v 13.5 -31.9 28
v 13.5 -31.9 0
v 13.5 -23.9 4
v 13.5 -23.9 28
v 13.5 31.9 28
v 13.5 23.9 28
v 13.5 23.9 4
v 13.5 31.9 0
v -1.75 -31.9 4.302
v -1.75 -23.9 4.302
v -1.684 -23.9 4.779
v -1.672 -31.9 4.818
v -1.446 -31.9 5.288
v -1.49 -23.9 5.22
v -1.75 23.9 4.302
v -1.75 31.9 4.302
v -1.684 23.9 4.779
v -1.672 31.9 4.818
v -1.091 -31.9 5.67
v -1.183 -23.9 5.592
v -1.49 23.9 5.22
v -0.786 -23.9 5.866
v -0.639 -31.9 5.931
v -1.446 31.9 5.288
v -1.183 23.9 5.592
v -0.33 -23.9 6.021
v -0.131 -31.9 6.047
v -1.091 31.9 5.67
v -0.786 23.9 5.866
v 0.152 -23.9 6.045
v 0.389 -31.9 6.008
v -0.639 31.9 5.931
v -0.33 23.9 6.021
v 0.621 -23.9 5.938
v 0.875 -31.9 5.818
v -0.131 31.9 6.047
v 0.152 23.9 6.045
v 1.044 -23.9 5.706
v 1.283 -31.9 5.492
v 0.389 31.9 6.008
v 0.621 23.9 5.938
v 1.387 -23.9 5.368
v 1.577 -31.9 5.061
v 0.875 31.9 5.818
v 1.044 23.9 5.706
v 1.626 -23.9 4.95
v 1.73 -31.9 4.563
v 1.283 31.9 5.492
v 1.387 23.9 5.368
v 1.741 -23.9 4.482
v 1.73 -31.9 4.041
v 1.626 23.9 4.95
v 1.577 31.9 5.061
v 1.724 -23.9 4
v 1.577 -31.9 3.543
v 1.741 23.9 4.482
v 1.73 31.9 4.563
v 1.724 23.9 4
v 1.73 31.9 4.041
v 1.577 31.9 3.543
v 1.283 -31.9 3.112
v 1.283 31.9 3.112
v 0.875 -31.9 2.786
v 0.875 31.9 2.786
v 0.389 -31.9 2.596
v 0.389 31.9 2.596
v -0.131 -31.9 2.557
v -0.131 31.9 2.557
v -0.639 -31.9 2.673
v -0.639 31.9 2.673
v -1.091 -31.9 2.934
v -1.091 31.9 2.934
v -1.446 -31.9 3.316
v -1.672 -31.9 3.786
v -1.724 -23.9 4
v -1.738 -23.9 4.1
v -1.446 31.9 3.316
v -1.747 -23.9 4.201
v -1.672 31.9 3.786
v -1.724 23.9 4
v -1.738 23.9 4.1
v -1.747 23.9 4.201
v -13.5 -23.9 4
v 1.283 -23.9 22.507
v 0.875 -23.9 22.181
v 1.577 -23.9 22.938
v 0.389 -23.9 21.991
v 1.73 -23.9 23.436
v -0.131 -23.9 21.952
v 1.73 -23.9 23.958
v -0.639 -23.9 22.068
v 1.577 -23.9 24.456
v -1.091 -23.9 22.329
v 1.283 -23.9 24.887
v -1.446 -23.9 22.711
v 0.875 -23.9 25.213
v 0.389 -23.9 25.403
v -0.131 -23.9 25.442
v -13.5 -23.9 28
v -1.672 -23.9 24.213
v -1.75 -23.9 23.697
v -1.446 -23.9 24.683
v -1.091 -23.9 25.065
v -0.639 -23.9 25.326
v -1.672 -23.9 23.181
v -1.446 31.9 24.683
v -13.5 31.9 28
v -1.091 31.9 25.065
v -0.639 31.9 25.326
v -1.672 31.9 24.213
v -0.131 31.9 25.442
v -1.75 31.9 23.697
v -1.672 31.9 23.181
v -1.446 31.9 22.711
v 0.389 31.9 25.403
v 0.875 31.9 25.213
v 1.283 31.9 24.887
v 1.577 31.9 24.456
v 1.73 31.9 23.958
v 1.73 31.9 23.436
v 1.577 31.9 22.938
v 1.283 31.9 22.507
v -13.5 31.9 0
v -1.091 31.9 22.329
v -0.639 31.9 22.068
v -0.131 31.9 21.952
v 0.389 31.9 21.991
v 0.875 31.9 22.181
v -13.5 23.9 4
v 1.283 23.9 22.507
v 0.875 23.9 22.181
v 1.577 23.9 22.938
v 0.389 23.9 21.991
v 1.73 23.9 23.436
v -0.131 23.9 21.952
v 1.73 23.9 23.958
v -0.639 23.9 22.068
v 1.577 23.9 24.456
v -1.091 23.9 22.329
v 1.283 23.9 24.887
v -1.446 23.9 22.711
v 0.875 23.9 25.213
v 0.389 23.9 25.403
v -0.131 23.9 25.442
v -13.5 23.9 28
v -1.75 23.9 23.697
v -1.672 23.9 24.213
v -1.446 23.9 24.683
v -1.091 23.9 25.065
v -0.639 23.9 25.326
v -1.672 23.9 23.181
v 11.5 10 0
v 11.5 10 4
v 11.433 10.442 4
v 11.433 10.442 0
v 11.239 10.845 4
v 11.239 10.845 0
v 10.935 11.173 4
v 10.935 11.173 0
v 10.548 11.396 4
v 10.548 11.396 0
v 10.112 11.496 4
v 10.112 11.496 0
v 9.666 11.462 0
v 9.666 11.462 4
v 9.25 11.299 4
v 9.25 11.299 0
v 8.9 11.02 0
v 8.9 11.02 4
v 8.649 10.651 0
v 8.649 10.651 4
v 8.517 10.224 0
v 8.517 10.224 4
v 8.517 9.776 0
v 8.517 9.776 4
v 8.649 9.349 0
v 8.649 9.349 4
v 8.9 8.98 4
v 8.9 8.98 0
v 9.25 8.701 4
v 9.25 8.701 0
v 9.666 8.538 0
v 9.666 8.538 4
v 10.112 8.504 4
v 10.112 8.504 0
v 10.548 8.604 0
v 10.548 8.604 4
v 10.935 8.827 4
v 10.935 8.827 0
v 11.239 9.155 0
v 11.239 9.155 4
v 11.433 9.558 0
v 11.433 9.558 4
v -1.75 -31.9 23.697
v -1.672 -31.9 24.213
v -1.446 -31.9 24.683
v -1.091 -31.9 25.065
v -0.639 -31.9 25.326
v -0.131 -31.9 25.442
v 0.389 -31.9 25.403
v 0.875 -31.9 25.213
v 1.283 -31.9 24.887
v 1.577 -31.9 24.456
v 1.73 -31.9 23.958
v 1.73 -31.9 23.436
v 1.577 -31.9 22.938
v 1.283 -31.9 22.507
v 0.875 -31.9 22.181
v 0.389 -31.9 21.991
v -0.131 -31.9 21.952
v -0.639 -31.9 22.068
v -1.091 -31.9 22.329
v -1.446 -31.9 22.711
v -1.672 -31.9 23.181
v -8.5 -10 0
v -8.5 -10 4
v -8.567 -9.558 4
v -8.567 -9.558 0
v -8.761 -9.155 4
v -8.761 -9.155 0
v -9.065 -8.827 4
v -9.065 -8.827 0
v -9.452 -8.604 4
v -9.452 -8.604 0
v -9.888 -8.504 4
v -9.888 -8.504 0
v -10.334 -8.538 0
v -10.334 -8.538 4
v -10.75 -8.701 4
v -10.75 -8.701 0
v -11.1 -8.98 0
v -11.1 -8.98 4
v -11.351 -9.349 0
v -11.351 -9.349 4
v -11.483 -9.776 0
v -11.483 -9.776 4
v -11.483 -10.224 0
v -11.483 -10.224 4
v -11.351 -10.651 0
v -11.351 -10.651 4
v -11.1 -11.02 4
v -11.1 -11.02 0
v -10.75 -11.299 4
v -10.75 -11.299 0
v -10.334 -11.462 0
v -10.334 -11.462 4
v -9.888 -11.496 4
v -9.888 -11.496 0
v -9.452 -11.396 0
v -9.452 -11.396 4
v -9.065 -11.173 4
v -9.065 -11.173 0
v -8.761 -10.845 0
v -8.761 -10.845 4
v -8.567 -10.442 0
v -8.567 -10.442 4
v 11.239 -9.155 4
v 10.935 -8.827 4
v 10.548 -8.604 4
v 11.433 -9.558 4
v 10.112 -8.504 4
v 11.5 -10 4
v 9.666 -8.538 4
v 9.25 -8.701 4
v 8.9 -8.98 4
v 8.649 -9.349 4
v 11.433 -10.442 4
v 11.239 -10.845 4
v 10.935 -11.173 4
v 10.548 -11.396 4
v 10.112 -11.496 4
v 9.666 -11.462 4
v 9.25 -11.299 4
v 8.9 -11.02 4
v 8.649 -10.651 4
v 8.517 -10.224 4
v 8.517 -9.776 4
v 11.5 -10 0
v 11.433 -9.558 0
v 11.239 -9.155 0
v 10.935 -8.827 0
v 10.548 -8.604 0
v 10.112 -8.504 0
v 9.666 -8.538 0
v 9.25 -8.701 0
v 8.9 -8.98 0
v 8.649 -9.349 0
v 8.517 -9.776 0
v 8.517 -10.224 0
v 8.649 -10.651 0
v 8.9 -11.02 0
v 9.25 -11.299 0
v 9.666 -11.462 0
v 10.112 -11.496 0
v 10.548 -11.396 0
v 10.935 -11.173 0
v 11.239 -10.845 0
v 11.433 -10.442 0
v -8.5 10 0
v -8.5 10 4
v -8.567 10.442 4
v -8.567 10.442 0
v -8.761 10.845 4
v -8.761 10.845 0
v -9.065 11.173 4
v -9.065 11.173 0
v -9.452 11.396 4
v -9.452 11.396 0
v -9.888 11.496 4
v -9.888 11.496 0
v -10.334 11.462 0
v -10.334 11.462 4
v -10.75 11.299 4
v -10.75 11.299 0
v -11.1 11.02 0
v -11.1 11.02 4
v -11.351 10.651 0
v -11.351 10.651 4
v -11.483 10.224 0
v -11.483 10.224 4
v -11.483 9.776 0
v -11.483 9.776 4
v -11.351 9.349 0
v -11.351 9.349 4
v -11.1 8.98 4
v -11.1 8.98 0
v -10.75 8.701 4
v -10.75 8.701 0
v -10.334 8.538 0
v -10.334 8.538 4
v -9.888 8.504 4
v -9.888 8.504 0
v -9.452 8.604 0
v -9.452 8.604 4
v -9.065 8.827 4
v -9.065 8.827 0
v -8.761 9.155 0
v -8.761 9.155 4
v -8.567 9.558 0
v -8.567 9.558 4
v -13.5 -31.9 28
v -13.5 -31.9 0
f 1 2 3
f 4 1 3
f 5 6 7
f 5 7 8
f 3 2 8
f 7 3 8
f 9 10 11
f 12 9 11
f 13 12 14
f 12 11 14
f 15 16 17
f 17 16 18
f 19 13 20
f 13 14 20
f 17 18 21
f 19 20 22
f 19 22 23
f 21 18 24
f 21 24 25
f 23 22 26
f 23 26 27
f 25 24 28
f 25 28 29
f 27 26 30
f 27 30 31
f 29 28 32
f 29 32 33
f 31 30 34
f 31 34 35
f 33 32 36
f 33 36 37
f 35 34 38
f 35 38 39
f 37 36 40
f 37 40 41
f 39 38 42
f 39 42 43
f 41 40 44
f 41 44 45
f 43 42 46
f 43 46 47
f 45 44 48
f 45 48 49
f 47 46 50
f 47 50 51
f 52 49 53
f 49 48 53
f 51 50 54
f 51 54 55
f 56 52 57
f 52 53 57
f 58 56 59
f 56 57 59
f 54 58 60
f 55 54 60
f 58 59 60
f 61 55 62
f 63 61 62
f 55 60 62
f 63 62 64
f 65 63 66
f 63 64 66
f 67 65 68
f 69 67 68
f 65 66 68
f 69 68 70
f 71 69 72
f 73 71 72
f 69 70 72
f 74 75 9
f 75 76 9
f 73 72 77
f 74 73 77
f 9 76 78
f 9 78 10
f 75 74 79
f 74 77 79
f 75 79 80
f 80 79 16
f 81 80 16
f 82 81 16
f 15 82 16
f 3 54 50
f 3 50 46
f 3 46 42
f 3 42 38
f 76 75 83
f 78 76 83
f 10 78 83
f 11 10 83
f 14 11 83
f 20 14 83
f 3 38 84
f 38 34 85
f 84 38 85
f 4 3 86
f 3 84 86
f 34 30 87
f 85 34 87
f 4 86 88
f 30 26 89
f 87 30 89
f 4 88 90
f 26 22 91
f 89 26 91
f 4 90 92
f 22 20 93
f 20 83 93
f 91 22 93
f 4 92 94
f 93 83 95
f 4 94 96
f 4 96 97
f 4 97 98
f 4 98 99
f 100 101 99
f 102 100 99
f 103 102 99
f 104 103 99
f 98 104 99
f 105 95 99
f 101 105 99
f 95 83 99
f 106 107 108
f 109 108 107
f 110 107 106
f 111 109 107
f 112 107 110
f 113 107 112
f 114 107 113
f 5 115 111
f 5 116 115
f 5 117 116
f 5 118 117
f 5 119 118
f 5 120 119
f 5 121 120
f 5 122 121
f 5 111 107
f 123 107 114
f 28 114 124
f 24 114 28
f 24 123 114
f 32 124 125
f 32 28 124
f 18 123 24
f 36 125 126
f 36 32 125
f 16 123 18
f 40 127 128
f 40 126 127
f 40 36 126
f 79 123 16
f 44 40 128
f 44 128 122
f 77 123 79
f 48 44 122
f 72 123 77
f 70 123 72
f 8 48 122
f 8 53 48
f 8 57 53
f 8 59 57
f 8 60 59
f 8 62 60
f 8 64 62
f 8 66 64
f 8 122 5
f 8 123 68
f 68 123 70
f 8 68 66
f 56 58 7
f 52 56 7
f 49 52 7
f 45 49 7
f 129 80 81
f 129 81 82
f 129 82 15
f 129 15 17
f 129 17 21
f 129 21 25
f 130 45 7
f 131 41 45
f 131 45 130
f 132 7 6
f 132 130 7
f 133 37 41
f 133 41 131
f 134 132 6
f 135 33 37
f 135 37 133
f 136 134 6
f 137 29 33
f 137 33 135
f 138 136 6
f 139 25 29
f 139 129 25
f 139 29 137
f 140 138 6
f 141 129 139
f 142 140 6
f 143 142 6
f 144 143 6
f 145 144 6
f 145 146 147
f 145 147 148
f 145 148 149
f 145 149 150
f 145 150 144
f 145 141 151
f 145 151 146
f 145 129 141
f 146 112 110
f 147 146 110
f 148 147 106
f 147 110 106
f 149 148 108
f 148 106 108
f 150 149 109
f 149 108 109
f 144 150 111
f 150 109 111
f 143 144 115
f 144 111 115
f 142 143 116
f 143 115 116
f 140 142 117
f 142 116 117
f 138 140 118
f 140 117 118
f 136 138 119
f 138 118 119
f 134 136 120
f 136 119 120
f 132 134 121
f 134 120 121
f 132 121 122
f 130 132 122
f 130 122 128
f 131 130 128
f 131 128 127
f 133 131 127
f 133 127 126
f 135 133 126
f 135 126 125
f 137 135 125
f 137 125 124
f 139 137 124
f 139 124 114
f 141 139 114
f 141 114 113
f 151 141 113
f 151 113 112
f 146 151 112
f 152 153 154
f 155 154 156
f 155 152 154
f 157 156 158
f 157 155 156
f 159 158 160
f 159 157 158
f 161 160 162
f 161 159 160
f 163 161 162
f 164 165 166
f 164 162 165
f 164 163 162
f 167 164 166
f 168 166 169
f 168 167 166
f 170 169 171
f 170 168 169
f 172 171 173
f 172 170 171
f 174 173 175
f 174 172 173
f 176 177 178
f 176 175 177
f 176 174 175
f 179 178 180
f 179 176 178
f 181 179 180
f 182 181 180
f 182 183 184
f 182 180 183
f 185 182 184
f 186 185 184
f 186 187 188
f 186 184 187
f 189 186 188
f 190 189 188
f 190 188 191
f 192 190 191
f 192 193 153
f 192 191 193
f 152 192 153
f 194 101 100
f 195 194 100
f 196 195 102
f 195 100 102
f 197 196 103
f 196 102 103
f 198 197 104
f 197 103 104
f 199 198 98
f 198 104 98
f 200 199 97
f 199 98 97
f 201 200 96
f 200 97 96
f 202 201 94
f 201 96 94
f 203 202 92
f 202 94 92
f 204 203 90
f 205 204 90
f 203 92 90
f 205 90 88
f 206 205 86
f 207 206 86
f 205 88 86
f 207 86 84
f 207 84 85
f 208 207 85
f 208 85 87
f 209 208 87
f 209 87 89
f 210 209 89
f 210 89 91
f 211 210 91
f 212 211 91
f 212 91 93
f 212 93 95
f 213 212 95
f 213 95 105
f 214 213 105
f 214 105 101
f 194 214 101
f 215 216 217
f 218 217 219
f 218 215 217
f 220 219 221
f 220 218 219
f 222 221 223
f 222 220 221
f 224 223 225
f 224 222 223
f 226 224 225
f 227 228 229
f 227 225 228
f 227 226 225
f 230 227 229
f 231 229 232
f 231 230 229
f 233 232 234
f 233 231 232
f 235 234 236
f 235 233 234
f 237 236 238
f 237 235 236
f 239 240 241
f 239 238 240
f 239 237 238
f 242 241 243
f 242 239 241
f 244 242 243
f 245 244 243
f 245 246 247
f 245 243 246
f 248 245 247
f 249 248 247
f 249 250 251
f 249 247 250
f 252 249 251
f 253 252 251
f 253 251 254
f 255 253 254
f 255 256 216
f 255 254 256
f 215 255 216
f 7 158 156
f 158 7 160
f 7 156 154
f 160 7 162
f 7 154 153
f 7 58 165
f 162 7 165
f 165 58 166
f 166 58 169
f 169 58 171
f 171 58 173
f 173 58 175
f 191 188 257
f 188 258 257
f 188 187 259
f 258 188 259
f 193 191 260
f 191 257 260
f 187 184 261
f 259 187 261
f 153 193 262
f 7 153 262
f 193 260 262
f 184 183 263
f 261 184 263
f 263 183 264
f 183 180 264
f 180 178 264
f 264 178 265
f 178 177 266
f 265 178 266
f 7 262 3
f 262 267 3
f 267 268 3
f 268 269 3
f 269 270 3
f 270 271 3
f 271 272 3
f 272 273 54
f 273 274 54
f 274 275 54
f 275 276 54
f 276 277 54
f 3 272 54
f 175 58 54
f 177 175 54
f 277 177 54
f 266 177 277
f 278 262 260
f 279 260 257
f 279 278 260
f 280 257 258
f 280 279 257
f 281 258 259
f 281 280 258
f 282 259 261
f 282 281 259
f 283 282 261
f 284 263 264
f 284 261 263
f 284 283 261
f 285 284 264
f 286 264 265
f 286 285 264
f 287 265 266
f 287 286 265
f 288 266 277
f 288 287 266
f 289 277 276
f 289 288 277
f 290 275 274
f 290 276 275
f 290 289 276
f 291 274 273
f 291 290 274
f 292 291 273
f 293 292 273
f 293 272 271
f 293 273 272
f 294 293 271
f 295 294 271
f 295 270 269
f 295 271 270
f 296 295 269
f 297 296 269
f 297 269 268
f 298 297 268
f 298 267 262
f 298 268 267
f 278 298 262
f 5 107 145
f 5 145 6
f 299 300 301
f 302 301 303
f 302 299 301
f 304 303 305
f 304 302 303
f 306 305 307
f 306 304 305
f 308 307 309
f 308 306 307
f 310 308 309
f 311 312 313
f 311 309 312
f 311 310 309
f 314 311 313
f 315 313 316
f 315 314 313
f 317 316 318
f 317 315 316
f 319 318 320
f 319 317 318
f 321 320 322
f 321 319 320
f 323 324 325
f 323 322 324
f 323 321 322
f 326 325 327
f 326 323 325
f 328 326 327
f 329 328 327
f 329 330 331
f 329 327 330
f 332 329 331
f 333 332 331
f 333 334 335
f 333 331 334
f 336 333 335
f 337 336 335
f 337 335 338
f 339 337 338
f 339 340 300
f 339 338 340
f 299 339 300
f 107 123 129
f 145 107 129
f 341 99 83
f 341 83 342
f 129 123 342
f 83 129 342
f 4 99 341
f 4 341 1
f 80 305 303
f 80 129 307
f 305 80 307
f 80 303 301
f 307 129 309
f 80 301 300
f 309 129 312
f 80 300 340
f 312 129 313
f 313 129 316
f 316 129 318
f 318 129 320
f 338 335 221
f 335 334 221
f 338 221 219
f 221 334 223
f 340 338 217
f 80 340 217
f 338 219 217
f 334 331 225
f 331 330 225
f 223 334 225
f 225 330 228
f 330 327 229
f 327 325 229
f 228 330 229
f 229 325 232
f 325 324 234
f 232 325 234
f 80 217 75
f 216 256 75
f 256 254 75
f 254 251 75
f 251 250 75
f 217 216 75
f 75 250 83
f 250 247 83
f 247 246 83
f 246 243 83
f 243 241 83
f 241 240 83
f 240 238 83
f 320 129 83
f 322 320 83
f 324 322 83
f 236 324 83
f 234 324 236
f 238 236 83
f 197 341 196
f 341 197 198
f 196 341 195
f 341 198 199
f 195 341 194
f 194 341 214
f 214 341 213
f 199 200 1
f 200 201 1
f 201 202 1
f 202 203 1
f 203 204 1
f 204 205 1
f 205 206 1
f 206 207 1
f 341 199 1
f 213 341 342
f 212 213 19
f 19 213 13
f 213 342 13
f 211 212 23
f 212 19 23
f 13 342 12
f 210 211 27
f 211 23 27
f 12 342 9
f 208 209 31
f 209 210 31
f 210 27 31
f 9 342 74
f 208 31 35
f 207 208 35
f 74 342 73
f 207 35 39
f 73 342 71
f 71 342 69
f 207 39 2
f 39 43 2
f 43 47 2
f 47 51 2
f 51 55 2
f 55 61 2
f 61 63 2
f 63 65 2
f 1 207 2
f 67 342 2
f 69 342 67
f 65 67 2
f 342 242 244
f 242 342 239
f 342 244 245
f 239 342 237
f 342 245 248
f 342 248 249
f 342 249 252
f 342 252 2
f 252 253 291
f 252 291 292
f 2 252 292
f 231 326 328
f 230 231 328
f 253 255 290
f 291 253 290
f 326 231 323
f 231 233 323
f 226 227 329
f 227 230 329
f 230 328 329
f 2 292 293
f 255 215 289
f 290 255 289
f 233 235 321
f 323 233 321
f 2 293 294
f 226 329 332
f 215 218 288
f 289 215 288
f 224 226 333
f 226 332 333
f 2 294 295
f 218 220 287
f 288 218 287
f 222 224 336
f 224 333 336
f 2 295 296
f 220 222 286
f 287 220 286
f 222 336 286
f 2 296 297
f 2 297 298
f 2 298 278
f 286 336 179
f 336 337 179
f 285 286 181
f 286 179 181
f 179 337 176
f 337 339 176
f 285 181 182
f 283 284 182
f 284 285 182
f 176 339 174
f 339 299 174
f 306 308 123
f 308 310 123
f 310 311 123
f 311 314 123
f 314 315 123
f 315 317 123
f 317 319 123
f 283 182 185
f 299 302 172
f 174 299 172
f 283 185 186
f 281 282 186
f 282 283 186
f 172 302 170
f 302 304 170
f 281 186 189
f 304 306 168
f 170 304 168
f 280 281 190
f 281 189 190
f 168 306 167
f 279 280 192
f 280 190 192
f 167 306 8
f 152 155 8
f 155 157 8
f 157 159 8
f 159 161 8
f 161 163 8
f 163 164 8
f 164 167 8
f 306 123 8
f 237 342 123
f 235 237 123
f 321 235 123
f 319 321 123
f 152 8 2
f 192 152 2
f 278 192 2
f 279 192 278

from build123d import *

# Parameters (mm, degrees)
F1_W     = 27
F1_H     = 43.8
F1_R     = 1.5
F1_H_2   = 10
F2_DEPTH = 28
F3_R     = 1.75
F4_DEPTH = 63.801
F5_W     = 47.8
F5_H     = 24
F6_DEPTH = 27.001


with BuildPart() as f2:
    # F1 (on Top) → F2 (new body)
    with BuildSketch(Plane.XY):
        Rectangle(F1_W, F1_H)
        with Locations((-10, -10)):
            Circle(F1_R, mode=Mode.SUBTRACT)
        with Locations((10, -10)):
            Circle(F1_R, mode=Mode.SUBTRACT)
        with Locations((-10, 10)):
            Circle(F1_R, mode=Mode.SUBTRACT)
        with Locations((10, 10)):
            Circle(F1_R, mode=Mode.SUBTRACT)
        with Locations((0, 26.9)):
            Rectangle(F1_W, F1_H_2)
        with Locations((0, -26.9)):
            Rectangle(F1_W, F1_H_2)
    extrude(amount=F2_DEPTH)

    # F3 (on face) → F4 (cut, through all)
    with BuildSketch(Plane(origin=(0, 31.9, 0), x_dir=(-1, 0, 0), z_dir=(0, 1, 0))):
        with Locations((0, 23.697)):
            Circle(F3_R)
        with Locations((0, 4.302)):
            Circle(F3_R)
    extrude(amount=-F4_DEPTH, mode=Mode.SUBTRACT)

    # F5 (on face) → F6 (cut, through all)
    with BuildSketch(Plane(origin=(-13.5, 0, 0), x_dir=(0, -1, 0), z_dir=(-1, 0, 0))):
        with Locations((0, 16)):
            Rectangle(F5_W, F5_H)
    extrude(amount=-F6_DEPTH, mode=Mode.SUBTRACT)


solid = f2.part
